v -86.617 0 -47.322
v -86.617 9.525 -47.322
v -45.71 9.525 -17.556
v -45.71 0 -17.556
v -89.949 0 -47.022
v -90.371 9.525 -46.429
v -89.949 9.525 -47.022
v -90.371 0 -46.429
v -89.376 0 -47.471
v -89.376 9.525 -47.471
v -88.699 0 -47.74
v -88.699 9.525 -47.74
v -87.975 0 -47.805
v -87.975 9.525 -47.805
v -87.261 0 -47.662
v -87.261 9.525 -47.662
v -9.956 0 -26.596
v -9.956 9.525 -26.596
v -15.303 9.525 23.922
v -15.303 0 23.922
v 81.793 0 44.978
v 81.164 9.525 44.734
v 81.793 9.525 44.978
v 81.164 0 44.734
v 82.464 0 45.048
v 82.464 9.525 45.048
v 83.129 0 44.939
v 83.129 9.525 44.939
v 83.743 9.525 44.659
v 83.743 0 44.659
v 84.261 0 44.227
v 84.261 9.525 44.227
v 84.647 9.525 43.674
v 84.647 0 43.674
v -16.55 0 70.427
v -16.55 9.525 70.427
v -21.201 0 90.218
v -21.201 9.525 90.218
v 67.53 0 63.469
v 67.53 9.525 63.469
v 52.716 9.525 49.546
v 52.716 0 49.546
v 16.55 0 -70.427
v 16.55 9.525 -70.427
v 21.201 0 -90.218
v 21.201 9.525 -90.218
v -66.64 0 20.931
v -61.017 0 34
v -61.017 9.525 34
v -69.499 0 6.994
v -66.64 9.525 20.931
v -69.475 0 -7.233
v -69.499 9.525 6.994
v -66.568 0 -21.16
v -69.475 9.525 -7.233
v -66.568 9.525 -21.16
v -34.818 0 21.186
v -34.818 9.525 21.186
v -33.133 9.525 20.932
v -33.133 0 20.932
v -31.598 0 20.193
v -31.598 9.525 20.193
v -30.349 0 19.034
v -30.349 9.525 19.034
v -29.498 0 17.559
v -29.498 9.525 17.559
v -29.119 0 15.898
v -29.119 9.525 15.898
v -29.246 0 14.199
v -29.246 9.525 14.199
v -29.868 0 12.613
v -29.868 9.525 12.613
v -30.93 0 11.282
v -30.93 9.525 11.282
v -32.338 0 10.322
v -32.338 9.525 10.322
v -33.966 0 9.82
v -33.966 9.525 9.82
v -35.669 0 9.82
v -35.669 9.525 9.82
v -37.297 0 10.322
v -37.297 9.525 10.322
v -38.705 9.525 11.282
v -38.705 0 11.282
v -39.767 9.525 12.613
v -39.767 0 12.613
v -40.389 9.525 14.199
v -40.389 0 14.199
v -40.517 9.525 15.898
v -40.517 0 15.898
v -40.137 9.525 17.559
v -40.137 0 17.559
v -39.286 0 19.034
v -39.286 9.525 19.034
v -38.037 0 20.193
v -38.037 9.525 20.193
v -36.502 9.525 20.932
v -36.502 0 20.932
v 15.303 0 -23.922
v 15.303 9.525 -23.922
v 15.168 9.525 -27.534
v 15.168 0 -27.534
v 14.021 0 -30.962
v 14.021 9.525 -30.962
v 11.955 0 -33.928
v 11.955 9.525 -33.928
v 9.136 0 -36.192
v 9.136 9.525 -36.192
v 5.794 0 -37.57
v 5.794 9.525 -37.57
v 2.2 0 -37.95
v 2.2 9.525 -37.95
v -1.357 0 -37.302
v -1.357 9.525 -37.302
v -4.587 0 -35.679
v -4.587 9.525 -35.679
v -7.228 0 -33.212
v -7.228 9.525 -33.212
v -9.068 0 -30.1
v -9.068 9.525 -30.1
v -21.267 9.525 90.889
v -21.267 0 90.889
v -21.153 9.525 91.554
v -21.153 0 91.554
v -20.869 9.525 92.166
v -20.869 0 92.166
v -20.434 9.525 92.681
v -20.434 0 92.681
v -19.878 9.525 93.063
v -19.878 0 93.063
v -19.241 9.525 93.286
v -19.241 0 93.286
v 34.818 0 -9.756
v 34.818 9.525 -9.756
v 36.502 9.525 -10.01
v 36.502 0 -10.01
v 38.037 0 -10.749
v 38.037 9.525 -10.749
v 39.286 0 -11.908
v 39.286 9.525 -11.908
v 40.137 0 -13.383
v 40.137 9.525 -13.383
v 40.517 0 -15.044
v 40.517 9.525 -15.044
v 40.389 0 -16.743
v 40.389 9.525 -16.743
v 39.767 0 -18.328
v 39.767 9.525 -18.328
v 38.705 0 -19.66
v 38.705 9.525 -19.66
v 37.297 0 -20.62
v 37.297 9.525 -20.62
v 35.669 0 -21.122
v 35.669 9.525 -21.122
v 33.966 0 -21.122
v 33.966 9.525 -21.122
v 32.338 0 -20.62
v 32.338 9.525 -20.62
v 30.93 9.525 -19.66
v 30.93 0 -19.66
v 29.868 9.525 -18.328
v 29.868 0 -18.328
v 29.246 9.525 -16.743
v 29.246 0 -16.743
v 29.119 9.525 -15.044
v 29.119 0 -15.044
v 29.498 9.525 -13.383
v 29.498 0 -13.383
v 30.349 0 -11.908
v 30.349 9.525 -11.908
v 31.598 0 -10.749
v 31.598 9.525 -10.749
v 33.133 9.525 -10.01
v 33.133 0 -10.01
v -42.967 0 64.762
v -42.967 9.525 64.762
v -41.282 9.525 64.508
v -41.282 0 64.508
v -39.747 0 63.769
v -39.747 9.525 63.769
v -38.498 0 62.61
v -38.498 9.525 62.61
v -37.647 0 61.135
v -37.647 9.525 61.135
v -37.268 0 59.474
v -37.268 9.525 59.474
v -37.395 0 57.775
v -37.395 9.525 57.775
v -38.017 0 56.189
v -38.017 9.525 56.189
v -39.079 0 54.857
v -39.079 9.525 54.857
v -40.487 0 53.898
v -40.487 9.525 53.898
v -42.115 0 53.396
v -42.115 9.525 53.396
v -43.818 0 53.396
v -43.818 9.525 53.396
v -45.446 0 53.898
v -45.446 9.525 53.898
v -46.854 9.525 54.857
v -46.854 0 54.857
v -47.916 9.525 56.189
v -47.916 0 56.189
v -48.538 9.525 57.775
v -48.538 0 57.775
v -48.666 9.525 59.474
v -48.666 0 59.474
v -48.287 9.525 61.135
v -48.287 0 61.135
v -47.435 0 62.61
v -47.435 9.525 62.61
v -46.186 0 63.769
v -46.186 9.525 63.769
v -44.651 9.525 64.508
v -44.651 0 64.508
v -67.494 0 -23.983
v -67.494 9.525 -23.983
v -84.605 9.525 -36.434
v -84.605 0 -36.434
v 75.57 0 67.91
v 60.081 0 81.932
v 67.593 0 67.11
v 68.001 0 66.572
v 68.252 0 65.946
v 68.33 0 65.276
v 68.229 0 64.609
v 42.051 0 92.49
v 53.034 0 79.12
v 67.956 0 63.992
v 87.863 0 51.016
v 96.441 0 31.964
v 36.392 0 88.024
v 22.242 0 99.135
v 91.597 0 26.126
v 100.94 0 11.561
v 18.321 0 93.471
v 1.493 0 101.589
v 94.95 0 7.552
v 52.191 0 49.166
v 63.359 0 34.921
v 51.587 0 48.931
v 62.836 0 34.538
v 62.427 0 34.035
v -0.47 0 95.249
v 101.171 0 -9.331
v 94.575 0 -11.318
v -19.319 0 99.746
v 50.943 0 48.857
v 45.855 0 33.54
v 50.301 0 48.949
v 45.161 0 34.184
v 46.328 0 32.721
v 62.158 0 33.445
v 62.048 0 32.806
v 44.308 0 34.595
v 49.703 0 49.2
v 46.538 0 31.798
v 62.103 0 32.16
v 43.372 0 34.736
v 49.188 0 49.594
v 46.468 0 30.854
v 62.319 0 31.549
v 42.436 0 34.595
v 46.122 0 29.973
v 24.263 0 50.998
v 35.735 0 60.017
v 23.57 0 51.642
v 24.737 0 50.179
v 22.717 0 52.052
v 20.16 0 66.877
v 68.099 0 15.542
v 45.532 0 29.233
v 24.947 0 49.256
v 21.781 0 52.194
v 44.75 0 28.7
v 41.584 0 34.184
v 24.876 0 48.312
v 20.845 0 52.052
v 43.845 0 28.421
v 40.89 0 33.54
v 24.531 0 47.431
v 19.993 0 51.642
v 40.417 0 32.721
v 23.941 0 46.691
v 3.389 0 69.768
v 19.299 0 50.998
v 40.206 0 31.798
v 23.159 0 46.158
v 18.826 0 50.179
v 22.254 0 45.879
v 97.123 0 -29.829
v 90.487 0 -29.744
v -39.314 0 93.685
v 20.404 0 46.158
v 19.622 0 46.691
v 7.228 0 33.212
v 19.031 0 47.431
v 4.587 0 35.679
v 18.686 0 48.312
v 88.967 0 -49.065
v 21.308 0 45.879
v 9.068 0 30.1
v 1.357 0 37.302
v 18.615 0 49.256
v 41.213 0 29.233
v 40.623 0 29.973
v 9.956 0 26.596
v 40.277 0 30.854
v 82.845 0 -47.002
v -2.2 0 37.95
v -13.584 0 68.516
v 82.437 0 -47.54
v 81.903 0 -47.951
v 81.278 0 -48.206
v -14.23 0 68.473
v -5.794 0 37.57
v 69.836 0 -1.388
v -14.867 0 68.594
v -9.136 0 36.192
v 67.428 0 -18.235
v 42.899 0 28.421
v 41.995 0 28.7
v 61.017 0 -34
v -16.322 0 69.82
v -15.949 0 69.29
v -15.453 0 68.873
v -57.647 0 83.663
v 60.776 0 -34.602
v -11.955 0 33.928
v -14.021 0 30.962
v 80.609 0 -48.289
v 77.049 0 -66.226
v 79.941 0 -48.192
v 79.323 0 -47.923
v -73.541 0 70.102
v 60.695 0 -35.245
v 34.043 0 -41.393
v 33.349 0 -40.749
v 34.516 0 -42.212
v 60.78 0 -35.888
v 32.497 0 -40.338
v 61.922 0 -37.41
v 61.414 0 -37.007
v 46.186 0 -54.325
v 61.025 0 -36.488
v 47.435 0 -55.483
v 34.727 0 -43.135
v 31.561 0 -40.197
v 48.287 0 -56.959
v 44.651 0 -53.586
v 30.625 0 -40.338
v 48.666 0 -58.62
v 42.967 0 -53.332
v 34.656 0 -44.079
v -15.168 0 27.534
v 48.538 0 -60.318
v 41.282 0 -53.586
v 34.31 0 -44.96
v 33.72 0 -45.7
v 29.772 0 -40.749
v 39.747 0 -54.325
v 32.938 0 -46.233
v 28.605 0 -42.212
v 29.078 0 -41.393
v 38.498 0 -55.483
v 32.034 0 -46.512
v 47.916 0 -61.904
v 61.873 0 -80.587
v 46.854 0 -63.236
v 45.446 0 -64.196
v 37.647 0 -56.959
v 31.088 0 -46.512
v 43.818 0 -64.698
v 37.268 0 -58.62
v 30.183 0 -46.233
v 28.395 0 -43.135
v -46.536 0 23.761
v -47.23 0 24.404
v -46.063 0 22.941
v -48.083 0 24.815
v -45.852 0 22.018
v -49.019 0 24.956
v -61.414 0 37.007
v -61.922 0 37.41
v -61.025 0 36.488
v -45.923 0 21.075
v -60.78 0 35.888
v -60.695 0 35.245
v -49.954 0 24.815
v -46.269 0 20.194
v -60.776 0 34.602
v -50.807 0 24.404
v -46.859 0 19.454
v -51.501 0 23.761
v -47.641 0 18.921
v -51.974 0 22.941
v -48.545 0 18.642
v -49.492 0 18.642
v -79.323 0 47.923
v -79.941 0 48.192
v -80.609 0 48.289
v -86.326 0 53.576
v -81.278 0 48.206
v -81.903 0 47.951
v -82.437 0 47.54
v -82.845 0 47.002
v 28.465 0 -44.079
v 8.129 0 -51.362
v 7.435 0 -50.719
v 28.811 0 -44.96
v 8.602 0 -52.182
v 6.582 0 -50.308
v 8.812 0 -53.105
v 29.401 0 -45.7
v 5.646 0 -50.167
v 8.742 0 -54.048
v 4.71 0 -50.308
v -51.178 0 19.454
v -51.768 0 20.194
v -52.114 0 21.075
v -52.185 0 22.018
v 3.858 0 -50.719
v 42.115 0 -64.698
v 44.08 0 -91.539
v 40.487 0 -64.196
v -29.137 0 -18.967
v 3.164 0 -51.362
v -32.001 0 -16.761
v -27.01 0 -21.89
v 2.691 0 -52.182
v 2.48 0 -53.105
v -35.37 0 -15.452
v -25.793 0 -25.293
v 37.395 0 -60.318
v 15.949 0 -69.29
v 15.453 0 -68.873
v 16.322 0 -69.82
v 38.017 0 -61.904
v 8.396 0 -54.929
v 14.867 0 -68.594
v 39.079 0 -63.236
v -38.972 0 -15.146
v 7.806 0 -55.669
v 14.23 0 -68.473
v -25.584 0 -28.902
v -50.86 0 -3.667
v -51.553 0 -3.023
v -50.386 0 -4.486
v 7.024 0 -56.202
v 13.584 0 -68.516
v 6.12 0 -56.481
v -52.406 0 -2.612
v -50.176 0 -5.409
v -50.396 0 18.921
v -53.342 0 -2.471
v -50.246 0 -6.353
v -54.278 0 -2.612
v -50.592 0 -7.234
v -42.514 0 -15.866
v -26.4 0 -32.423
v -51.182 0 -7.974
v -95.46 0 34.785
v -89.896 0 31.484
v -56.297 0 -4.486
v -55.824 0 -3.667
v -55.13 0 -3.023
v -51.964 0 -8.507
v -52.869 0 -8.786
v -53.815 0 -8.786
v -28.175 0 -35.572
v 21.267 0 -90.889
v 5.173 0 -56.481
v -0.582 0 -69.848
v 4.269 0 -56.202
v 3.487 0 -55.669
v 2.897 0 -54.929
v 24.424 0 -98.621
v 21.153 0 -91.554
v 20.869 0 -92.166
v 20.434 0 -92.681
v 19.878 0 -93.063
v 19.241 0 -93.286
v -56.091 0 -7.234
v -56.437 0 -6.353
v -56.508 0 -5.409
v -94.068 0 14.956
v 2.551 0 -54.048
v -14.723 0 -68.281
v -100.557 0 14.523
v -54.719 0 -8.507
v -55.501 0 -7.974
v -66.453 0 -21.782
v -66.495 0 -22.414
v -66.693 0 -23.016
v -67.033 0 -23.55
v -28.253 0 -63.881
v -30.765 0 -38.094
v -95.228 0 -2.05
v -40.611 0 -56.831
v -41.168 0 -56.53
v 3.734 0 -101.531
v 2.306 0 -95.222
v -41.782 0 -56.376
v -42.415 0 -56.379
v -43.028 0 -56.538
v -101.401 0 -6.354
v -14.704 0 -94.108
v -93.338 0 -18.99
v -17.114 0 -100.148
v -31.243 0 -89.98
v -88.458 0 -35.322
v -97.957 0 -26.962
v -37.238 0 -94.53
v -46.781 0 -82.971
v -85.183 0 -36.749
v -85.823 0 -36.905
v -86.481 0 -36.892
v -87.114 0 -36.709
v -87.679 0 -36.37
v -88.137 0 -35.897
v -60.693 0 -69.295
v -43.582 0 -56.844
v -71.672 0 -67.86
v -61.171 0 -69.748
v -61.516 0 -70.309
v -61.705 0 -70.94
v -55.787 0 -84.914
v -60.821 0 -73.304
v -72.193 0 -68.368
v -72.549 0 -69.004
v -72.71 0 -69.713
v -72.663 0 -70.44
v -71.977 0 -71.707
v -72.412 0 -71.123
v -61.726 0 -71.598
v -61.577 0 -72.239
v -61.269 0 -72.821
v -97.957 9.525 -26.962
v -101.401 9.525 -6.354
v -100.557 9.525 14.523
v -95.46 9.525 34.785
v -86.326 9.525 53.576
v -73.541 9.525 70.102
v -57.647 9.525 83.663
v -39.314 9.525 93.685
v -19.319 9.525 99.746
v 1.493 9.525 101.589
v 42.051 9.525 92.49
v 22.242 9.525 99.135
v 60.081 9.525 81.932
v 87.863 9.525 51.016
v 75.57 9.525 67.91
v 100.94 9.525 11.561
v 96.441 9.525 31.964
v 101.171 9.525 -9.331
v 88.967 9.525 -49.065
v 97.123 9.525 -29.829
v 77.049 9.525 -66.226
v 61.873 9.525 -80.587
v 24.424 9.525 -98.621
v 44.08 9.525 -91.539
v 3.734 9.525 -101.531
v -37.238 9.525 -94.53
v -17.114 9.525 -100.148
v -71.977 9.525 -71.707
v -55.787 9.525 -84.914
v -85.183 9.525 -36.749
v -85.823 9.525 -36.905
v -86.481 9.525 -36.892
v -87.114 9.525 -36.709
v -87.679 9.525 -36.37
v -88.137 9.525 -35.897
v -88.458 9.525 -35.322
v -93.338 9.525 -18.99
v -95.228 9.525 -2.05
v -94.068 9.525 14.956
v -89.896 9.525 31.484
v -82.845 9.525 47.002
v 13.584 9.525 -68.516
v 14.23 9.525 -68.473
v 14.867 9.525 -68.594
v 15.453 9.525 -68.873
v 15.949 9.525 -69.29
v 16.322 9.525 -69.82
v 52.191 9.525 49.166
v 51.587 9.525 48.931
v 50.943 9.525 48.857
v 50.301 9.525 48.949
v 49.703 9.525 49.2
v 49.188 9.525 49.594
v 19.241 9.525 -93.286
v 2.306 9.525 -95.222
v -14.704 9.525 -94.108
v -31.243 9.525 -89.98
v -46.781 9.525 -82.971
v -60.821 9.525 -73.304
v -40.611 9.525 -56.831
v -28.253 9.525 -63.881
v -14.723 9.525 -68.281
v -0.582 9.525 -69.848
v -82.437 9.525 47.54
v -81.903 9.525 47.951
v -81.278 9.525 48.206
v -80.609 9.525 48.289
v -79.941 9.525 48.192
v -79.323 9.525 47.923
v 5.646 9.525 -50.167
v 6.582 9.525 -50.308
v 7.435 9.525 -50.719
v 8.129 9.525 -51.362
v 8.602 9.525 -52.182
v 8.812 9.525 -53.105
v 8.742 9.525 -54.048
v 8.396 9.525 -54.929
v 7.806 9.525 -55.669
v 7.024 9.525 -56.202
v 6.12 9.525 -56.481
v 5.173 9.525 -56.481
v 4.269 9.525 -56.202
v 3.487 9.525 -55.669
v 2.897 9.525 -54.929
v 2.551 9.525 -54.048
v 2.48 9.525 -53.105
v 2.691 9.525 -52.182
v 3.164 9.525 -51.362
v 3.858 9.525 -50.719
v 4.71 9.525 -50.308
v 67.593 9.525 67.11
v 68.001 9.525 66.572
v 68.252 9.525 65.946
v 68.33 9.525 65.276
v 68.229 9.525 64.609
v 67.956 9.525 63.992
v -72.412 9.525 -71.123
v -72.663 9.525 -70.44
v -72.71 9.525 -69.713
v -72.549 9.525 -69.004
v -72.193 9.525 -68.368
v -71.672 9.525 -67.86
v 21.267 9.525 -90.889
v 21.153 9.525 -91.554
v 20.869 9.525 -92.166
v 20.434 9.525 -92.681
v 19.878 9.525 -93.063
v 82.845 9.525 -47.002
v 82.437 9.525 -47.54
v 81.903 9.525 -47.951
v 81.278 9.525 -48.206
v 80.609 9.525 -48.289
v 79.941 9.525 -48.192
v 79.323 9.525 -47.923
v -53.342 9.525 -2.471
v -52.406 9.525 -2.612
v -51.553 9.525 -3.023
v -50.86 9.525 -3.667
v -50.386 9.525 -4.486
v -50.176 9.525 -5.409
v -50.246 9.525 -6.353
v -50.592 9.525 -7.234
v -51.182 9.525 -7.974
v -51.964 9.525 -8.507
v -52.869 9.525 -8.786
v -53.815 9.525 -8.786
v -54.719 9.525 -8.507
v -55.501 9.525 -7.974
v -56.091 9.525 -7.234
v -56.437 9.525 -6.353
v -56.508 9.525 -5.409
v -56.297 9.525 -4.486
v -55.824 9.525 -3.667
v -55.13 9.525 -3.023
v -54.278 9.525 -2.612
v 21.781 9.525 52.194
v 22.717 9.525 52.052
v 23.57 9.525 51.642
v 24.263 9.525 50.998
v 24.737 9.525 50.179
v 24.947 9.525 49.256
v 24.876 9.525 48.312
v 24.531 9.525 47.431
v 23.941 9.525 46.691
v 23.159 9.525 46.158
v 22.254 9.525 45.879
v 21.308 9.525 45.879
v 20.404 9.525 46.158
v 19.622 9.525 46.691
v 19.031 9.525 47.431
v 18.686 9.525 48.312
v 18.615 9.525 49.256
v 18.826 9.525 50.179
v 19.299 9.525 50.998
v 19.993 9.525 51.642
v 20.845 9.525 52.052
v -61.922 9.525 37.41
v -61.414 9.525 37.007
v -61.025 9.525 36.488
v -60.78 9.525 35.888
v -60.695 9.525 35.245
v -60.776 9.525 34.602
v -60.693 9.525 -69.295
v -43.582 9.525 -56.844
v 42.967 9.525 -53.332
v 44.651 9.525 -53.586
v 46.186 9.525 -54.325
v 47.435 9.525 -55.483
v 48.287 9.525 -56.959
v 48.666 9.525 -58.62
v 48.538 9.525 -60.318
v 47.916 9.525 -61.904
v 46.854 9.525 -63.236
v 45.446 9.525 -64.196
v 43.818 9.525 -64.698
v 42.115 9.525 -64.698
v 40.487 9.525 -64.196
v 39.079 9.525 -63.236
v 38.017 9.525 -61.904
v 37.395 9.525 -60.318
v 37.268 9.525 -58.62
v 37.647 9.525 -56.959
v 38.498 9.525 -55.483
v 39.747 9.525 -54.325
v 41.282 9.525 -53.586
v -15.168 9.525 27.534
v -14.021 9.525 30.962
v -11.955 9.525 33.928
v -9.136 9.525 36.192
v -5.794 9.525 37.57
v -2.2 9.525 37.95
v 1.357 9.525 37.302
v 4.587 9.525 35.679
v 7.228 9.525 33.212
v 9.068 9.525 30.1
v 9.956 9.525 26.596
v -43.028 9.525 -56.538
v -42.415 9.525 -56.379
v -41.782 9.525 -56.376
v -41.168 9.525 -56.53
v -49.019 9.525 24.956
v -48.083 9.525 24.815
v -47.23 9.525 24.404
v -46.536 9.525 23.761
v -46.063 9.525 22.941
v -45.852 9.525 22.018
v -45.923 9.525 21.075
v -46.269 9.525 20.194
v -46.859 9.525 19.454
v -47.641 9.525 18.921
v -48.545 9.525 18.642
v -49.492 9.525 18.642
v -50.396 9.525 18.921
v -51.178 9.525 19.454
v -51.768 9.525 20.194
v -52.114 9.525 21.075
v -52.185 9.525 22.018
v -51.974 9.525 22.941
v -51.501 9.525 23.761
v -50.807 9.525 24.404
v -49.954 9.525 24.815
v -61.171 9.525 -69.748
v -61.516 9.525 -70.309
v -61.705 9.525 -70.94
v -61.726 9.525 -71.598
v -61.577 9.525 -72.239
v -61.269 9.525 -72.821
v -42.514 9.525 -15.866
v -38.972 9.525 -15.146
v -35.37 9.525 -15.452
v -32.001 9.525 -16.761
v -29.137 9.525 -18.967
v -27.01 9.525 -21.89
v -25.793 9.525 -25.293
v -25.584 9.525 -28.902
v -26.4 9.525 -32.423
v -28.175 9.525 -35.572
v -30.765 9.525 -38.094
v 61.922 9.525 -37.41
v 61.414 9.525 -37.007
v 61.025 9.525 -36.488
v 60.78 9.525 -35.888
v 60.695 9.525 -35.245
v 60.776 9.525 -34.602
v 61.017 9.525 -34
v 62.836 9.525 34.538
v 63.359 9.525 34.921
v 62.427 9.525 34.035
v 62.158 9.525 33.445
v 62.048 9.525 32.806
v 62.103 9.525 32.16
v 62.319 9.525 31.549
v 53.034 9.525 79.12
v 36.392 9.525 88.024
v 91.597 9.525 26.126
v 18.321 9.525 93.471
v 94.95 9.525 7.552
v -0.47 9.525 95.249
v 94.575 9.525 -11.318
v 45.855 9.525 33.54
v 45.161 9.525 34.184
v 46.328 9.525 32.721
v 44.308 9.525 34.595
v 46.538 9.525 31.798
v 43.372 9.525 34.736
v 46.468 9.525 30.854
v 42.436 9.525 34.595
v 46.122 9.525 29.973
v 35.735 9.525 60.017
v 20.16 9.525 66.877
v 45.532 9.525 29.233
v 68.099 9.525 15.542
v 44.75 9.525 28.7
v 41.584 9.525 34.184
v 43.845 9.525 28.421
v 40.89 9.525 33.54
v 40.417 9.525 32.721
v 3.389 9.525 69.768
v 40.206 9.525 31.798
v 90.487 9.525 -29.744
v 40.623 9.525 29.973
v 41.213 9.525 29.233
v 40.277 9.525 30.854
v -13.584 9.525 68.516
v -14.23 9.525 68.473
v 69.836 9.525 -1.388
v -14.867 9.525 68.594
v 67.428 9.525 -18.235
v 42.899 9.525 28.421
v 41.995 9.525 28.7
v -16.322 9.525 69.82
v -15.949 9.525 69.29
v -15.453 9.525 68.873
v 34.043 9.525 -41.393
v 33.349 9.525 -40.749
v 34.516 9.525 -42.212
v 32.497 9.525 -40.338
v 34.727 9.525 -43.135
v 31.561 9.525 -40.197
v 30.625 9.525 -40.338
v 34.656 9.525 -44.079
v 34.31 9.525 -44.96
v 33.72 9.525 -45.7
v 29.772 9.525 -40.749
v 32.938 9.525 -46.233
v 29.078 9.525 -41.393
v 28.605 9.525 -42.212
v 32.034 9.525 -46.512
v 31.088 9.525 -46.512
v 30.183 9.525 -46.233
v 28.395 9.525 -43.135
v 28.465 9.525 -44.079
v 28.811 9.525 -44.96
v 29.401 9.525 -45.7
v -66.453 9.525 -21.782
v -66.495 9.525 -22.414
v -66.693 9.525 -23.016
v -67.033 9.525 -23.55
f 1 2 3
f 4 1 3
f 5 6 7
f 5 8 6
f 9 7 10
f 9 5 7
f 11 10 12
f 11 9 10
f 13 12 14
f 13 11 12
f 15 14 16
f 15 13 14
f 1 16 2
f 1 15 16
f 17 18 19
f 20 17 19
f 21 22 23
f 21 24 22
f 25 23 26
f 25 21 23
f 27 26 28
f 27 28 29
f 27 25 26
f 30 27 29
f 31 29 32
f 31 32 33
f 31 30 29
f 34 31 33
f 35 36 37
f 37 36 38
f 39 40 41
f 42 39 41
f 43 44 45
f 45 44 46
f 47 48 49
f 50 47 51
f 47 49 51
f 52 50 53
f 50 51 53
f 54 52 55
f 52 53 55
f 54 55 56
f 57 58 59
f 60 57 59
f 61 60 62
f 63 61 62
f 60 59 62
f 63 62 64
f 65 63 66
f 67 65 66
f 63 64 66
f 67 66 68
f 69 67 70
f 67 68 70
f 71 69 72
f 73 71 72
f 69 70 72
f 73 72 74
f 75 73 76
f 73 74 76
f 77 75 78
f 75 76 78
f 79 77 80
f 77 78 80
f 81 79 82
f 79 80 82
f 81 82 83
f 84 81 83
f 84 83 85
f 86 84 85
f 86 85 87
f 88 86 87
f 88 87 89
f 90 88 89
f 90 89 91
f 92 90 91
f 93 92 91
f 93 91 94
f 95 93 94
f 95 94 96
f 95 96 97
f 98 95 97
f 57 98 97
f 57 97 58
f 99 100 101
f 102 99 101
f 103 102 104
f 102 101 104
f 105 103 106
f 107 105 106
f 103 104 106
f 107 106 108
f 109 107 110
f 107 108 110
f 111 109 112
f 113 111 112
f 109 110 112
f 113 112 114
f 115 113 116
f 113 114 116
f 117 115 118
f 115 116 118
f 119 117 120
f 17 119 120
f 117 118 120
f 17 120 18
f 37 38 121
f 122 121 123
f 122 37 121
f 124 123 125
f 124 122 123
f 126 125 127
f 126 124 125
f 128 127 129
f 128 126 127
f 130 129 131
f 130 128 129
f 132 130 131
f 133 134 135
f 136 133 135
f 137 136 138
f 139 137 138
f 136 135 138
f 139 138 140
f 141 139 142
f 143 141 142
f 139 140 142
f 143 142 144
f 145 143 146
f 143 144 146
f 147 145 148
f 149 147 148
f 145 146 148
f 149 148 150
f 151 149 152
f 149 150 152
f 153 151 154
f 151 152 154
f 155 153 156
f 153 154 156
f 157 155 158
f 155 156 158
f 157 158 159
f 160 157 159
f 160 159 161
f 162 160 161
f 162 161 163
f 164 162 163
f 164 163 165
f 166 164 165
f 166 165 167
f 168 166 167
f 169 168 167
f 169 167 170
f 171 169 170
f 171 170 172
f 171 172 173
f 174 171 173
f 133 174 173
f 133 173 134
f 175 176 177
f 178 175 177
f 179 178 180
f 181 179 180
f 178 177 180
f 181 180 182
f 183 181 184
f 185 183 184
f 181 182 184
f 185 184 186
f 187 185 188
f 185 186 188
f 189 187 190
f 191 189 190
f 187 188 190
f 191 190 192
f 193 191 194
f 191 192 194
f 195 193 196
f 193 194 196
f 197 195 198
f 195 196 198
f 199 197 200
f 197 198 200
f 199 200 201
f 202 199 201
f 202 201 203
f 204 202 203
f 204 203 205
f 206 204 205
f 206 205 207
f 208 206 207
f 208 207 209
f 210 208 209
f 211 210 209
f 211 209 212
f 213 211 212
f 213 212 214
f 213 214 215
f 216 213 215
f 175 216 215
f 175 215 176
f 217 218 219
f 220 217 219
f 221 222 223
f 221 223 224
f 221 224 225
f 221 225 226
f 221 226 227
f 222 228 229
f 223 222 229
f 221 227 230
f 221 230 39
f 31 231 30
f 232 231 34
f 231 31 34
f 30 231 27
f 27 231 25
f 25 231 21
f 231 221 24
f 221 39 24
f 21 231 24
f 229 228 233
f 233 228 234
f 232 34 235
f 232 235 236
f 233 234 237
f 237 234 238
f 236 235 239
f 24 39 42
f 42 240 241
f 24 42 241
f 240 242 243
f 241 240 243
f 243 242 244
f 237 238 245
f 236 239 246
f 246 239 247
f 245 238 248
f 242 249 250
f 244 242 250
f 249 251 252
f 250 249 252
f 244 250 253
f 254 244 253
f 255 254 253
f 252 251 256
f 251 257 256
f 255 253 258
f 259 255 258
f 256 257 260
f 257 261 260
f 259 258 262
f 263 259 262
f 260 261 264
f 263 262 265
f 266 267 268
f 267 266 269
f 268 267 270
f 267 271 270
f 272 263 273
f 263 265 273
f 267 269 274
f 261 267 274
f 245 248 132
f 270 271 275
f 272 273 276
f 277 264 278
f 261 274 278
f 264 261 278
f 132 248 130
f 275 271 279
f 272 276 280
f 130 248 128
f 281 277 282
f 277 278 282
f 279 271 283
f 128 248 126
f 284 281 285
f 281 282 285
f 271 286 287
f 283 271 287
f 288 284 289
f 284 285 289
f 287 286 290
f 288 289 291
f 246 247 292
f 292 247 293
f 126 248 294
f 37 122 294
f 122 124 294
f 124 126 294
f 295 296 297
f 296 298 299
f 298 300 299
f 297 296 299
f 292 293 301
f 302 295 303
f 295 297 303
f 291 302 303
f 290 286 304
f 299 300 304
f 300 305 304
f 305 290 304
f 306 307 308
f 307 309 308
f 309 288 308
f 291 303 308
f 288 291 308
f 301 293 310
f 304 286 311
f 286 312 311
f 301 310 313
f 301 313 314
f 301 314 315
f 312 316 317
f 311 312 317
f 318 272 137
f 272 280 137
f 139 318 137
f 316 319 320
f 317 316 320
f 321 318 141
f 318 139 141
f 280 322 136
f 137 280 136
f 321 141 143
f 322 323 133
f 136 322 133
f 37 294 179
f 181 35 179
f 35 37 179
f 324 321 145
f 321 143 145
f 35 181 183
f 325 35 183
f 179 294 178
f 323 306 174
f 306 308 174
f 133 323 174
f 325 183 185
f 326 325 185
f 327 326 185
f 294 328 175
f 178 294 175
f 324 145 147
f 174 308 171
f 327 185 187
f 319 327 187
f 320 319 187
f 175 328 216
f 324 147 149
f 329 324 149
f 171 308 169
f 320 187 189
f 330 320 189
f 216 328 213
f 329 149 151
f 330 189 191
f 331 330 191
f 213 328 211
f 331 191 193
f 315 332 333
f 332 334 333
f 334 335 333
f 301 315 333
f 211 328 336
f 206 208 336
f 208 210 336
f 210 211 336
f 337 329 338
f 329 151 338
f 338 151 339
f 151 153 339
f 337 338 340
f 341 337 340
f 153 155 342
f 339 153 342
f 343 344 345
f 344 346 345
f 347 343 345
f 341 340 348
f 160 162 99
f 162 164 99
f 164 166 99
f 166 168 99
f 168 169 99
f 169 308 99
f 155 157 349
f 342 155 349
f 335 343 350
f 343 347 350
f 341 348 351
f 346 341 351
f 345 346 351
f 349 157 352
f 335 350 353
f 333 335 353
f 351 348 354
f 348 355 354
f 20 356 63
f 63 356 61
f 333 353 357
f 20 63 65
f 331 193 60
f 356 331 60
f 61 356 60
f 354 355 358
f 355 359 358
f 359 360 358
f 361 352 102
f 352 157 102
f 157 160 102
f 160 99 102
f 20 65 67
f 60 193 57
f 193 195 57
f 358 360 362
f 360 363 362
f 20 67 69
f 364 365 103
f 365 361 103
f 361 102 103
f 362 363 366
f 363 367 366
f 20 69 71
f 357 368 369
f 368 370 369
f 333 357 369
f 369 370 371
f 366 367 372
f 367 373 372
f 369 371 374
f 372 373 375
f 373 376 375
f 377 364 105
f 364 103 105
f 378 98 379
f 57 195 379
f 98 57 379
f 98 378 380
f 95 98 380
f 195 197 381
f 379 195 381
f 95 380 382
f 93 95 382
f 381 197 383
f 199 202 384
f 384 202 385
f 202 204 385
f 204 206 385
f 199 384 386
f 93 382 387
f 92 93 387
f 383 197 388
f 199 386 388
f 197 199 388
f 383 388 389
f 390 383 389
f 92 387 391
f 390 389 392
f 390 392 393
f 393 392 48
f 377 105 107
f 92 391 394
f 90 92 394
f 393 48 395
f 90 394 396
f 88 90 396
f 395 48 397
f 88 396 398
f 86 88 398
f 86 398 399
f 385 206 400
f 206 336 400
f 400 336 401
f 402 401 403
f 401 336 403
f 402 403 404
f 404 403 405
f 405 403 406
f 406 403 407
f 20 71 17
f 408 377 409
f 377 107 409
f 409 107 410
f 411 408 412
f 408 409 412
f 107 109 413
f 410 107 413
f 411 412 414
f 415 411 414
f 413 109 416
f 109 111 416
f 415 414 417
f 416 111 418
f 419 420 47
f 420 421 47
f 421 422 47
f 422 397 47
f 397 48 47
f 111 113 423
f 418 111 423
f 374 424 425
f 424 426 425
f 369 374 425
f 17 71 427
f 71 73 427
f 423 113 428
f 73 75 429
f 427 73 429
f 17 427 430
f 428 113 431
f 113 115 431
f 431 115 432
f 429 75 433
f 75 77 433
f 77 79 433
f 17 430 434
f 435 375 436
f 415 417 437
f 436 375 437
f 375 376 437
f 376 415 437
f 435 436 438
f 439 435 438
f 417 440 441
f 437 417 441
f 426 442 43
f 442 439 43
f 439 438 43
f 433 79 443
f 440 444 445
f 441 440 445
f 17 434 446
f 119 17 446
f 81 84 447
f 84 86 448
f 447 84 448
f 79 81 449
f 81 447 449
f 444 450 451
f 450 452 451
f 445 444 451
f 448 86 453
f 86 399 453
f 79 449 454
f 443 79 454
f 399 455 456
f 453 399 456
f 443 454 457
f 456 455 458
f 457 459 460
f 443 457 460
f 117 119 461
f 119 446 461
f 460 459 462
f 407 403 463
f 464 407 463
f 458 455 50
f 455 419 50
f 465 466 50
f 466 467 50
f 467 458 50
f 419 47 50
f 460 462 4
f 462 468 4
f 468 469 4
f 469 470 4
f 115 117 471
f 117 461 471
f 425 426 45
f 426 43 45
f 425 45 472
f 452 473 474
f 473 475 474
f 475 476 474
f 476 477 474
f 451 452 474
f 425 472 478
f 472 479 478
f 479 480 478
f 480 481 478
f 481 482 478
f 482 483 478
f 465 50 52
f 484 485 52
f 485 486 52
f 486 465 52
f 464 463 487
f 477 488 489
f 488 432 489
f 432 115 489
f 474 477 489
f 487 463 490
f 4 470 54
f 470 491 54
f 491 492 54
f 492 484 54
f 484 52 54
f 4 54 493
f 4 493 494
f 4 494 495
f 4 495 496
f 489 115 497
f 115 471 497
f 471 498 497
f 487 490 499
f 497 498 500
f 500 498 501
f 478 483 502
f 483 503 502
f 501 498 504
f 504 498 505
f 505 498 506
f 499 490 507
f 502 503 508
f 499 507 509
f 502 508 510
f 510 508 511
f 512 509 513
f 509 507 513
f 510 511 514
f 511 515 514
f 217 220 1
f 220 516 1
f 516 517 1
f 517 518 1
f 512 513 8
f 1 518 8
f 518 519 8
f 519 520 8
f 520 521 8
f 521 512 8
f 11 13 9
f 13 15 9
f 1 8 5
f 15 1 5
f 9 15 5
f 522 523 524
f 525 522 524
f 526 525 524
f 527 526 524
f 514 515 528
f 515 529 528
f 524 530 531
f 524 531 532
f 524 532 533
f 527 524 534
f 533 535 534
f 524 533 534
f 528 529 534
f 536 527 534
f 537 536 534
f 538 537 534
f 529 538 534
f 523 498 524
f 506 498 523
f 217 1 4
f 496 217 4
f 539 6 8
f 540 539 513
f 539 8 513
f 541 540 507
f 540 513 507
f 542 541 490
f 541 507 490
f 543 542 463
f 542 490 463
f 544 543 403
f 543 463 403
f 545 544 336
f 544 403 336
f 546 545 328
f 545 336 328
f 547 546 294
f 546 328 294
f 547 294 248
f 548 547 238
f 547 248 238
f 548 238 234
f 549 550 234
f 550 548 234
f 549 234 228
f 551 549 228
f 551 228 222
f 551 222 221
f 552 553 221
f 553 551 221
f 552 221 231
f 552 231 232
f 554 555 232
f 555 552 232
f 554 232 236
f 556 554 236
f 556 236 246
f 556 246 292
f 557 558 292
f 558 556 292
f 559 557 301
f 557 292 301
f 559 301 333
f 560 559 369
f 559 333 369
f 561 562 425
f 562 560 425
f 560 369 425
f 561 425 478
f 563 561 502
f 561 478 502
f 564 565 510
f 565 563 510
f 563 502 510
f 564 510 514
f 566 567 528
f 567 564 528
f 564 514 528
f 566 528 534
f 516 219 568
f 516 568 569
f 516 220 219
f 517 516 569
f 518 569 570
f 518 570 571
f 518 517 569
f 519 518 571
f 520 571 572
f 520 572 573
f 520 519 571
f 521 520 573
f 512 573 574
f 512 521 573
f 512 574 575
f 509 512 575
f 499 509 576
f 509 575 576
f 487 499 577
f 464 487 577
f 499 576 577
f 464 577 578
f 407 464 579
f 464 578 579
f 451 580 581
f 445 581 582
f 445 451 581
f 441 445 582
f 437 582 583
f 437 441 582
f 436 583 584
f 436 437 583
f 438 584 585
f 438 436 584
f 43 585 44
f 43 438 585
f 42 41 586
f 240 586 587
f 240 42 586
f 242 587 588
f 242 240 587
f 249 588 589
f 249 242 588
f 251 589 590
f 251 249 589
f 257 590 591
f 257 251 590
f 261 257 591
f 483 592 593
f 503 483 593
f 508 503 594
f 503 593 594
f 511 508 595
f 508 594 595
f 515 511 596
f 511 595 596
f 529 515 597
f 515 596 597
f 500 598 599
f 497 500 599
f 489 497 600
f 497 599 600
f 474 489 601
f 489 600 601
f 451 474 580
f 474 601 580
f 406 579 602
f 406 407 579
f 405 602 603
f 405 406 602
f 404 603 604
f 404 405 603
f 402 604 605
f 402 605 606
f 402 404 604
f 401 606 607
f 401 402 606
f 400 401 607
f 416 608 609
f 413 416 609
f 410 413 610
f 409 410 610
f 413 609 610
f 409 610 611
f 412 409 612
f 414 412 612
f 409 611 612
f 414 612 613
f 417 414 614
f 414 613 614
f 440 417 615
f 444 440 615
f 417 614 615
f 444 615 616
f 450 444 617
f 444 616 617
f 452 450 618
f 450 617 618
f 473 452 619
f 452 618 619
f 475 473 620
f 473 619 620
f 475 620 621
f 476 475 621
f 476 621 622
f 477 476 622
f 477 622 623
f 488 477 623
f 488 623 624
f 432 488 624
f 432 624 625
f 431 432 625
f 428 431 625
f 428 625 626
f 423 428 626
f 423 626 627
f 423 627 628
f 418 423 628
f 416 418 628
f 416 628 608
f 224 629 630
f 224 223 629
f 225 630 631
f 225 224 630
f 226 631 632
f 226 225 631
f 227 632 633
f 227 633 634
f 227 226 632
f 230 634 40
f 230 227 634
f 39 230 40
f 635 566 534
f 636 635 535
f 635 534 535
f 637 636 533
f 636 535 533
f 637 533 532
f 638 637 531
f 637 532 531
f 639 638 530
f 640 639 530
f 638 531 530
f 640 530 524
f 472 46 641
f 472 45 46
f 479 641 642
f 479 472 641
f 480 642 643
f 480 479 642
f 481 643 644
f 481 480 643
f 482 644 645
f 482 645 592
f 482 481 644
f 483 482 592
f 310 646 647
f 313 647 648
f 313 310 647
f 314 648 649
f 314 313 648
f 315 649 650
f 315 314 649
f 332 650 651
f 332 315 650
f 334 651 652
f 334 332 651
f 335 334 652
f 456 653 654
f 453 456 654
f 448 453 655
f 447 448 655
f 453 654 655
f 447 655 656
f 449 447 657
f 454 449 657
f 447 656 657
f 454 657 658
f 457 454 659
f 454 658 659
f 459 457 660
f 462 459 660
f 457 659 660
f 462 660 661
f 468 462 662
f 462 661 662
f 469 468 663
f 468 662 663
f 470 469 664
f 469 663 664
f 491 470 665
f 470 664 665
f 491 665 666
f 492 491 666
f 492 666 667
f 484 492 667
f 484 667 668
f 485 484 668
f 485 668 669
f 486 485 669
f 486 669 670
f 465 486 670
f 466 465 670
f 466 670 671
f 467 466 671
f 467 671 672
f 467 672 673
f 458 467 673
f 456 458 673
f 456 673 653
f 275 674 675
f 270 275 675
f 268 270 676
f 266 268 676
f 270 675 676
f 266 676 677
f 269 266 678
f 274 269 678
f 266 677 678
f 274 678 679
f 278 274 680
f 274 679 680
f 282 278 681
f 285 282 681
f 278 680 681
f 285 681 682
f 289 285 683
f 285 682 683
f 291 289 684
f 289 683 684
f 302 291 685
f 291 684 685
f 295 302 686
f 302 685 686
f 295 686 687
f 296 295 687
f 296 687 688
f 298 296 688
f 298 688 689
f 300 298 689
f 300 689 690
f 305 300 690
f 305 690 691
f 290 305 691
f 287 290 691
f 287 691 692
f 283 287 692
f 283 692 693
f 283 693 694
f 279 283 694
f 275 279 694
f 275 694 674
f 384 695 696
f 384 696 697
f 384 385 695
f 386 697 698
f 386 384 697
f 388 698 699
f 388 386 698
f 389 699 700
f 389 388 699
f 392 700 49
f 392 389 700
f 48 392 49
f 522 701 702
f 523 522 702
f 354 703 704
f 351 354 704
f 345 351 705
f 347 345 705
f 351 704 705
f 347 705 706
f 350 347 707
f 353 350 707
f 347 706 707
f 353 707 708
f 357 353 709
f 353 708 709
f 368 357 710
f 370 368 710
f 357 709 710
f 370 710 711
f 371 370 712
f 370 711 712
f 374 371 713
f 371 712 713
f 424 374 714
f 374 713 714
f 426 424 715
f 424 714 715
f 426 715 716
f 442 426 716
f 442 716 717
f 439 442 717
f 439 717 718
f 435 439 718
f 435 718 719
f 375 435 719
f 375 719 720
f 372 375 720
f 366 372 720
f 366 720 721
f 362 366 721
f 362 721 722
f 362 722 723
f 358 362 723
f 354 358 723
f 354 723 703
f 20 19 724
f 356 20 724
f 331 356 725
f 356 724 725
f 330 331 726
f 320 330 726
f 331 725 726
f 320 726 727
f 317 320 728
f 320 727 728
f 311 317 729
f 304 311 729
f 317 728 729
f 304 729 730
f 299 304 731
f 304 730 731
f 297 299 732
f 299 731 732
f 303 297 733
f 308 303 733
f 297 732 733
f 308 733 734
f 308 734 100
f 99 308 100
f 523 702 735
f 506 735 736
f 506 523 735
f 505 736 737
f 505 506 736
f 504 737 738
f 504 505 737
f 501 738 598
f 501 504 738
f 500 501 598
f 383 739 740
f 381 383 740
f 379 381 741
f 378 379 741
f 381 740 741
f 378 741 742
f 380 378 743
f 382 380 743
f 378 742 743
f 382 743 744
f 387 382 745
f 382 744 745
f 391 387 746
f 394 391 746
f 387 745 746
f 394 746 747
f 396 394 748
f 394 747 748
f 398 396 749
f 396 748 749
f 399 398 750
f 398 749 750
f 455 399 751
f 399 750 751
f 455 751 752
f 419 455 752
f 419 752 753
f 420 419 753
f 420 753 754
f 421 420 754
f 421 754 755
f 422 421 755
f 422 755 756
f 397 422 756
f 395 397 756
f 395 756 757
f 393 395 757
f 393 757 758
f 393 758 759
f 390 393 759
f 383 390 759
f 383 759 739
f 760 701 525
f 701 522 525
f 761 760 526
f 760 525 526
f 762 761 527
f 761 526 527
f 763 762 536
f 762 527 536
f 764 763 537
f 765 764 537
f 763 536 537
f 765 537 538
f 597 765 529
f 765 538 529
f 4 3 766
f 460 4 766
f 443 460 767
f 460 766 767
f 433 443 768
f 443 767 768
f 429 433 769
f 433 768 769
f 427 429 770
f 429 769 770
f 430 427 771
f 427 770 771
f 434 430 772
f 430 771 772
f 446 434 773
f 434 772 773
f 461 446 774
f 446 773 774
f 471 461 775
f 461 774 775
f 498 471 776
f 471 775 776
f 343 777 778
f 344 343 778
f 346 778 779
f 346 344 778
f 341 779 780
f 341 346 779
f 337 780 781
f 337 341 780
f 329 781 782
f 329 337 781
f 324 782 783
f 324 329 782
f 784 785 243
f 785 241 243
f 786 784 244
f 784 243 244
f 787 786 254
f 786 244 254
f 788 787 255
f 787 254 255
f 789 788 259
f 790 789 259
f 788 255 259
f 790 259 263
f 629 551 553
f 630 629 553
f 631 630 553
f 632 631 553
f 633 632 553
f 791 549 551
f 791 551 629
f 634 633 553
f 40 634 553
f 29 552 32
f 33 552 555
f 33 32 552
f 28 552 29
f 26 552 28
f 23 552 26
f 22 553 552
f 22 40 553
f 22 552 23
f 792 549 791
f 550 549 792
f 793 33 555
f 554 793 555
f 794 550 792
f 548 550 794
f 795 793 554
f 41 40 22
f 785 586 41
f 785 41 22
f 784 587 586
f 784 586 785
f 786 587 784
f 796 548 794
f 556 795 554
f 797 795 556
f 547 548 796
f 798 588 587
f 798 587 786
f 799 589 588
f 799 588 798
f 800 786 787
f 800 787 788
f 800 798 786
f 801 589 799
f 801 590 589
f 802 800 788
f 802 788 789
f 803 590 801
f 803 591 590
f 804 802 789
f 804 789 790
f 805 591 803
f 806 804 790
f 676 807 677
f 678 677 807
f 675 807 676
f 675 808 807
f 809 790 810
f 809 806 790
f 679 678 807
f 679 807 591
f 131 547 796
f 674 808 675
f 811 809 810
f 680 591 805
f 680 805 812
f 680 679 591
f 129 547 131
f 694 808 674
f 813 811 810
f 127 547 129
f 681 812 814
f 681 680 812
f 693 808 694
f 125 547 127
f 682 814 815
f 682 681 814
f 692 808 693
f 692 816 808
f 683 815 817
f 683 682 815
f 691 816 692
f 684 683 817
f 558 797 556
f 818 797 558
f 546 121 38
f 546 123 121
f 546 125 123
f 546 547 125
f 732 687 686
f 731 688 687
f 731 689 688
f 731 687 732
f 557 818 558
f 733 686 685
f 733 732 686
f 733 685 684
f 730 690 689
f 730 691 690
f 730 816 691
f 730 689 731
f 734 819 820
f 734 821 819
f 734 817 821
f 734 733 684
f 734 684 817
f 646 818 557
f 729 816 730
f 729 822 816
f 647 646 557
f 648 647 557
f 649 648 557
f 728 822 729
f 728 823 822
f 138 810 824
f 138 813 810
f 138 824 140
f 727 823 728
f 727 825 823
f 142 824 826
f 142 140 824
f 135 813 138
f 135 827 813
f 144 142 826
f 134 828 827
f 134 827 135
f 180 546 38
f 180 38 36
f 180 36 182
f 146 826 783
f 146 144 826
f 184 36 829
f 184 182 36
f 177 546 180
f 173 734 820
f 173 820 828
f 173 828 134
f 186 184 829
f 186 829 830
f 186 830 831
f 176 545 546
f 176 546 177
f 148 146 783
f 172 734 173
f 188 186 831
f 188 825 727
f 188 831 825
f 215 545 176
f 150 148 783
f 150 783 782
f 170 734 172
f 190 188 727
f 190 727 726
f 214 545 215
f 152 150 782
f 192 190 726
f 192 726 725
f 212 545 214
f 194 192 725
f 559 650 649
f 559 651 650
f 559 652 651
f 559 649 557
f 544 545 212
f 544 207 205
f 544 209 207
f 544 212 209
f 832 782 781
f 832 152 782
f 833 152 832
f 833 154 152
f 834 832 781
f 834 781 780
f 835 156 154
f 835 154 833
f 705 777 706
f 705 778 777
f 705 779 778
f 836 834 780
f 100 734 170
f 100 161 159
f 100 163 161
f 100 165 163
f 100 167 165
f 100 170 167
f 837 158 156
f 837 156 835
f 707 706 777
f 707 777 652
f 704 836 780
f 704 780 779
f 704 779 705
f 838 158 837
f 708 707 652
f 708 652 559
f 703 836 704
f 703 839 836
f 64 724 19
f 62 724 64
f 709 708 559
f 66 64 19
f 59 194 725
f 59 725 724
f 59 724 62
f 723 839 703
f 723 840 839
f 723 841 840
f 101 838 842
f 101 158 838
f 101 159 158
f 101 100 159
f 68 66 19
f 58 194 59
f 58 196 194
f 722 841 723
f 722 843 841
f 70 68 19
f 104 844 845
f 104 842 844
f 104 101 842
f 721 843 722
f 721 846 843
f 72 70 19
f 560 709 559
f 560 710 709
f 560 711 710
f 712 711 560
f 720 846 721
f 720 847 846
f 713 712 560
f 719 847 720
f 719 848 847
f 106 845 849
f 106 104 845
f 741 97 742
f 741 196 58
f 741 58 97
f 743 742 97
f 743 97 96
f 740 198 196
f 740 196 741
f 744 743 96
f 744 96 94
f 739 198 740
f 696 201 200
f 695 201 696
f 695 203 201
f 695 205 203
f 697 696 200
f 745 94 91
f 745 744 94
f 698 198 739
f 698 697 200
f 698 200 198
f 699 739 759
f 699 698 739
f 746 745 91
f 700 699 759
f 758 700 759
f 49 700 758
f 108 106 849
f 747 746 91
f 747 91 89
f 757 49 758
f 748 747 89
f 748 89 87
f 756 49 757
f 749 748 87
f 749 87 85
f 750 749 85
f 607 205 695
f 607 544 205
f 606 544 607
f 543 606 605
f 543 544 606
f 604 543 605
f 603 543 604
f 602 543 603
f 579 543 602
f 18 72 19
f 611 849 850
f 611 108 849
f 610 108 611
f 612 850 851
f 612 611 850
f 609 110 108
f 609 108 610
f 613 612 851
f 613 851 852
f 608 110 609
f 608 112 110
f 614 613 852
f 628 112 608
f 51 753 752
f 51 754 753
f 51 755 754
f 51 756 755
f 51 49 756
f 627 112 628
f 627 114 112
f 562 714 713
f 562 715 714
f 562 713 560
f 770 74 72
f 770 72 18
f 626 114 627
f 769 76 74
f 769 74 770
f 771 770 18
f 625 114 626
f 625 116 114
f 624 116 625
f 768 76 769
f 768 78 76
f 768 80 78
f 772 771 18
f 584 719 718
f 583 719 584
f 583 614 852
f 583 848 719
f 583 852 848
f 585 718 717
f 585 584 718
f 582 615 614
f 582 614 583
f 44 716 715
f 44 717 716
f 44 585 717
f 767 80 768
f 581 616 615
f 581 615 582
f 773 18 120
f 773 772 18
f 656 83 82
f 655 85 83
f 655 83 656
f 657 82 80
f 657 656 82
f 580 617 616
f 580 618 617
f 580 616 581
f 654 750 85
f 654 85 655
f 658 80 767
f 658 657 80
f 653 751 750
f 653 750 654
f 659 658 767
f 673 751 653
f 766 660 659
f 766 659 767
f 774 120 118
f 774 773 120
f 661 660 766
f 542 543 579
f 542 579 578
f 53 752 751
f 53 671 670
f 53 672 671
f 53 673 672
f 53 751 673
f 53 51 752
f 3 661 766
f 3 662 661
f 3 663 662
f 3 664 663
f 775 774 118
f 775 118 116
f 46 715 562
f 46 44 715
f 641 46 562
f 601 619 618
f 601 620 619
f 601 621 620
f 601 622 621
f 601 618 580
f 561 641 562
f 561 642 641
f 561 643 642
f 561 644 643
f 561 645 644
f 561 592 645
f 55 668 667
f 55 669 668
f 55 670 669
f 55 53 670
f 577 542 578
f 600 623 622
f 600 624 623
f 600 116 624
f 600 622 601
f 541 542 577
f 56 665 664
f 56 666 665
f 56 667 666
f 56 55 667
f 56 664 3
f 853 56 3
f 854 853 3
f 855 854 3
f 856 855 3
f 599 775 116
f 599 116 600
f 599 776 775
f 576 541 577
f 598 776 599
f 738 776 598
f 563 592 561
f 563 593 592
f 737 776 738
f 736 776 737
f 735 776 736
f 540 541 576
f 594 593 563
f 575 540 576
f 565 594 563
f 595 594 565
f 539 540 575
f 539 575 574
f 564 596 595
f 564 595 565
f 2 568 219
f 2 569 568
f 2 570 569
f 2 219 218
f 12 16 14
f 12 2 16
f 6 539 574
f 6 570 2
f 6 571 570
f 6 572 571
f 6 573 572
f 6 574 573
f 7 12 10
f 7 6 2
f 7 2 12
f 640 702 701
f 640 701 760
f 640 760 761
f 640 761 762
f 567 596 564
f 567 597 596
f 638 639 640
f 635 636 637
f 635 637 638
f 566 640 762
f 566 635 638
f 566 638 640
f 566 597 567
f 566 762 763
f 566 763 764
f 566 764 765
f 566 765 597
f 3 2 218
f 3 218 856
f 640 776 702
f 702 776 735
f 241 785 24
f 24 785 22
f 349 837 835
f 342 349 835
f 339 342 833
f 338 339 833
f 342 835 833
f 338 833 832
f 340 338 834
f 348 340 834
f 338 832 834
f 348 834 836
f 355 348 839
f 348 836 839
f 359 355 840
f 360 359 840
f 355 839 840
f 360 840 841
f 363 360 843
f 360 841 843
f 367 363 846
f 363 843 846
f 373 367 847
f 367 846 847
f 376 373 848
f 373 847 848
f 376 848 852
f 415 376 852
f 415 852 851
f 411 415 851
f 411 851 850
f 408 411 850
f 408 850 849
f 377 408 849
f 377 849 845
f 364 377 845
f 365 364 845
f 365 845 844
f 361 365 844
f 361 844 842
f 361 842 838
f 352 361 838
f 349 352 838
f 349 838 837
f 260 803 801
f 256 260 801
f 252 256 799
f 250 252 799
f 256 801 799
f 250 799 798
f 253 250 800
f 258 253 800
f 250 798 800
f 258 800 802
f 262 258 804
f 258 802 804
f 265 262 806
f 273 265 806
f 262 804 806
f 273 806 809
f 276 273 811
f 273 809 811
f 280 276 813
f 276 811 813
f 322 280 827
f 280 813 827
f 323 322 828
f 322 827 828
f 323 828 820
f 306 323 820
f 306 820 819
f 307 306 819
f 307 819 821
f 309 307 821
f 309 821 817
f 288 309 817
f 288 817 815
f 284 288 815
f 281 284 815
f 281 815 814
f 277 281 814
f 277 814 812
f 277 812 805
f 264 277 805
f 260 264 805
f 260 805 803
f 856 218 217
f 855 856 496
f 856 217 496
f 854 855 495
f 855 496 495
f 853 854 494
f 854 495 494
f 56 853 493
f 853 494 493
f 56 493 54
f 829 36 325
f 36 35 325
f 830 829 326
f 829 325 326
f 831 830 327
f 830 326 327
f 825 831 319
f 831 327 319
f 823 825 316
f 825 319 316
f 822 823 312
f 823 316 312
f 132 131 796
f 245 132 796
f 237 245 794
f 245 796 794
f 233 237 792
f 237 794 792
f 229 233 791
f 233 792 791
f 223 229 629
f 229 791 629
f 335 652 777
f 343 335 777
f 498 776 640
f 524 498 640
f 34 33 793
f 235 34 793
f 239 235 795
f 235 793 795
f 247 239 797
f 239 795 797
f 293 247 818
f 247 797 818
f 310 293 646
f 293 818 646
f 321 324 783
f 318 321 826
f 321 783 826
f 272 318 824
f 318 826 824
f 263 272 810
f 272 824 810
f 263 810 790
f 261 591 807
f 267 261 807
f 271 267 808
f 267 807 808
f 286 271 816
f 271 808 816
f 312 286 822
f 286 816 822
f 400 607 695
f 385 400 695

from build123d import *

# Parameters (mm, degrees)
SKETCH1_R           = 101.6
BOSS_EXTRUDE1_DEPTH = 9.525
SKETCH2_R           = 4.7625
SKETCH2_R_2         = 3.175
CUT_EXTRUDE1_DEPTH  = 22.86
SKETCH3_R           = 4.7625
CUT_EXTRUDE2_DEPTH  = 144.999463975
FILLET1_R           = 2.54
FILLET3_R           = 2.54
SKETCH4_R           = 5.715
CUT_EXTRUDE3_DEPTH  = 17.78


with BuildPart() as part:
    # Sketch1 → Boss-Extrude1 (new body)
    with BuildSketch(Plane(origin=(0, 0, 0), x_dir=(1, 0, 0), z_dir=(0, 1, 0))):
        with Locations(Location((0, 0, 0), (0, 0, 90))):
            Circle(SKETCH1_R)
    extrude(amount=BOSS_EXTRUDE1_DEPTH)

    # Sketch2 → Cut-Extrude1 (cut)
    with BuildSketch(Plane(origin=(0, 9.525, 0), x_dir=(1, 0, 0), z_dir=(0, 1, 0))):
        with BuildLine():
            Line((-9.955759688, 26.595729902), (-15.303128109, -23.922045692))
            ThreePointArc((-15.303128109, -23.922045692), (-4.010526316, -37.888331696), (9.955759688, -26.595729902))
            Line((9.955759688, -26.595729902), (15.303128109, 23.922045692))
            ThreePointArc((15.303128109, 23.922045692), (4.010526316, 37.888331696), (-9.955759688, 26.595729902))
        make_face()
        with Locations(Location((34.817520913, 15.470948176, 0), (0, 0, 270))):
            Circle(SKETCH2_R)
        with Locations(Location((-34.817520913, -15.470948176, 0), (0, 0, 270))):
            Circle(SKETCH2_R)
        with BuildLine():
            Line((-30.765292524, 38.093536125), (-87.237043764, 79.186441231))
            Line((-87.237043764, 79.186441231), (-104.485964967, 60.325))
            Line((-104.485964967, 60.325), (-45.710214871, 17.555539727))
            ThreePointArc((-45.710214871, 17.555539727), (-27.968755498, 20.352076753), (-30.765292524, 38.093536125))
        make_face()
        with Locations(Location((5.646300897, 53.341856998, 0), (0, 0, 270))):
            Circle(SKETCH2_R_2)
        with Locations(Location((31.560768513, 43.372252797, 0), (0, 0, 270))):
            Circle(SKETCH2_R_2)
        with Locations(Location((-53.341856998, 5.646300897, 0), (0, 0, 270))):
            Circle(SKETCH2_R_2)
        with Locations(Location((43.372252797, -31.560768513, 0), (0, 0, 270))):
            Circle(SKETCH2_R_2)
        with Locations(Location((-49.018553694, -21.781088485, 0), (0, 0, 270))):
            Circle(SKETCH2_R_2)
        with Locations(Location((21.781088485, -49.018553694, 0), (0, 0, 270))):
            Circle(SKETCH2_R_2)
    extrude(amount=-CUT_EXTRUDE1_DEPTH, mode=Mode.SUBTRACT)

    # Sketch3 → Cut-Extrude2 (cut, through all)
    with BuildSketch(Plane(origin=(0, 9.525, 0), x_dir=(1, 0, 0), z_dir=(0, 1, 0))):
        with BuildLine():
            Line((61.173834056, -33.71623536), (83.418864622, -45.976684582))
            ThreePointArc((83.418864622, -45.976684582), (95.231198209, 1.892455481), (81.526409141, 49.254513627))
            Line((81.526409141, 49.254513627), (59.78603337, 36.119976659))
            ThreePointArc((59.78603337, 36.119976659), (69.83621202, 1.387800686), (61.173834056, -33.71623536))
        make_face()
        with BuildLine():
            ThreePointArc((50.898077232, -47.837310063), (20.160372855, -66.87736438), (-15.979287148, -67.997682918))
            Line((-15.979287148, -67.997682918), (-21.78993702, -92.72411307))
            ThreePointArc((-21.78993702, -92.72411307), (27.491417529, -91.196405972), (69.406468953, -65.232695541))
            Line((69.406468953, -65.232695541), (50.898077232, -47.837310063))
        make_face()
        with BuildLine():
            ThreePointArc((-59.78603337, -36.119976659), (-69.466812234, -7.306469604), (-65.992729528, 22.890656378))
            Line((-65.992729528, 22.890656378), (-87.200441174, 38.322911673))
            ThreePointArc((-87.200441174, 38.322911673), (-95.050717303, -6.15821729), (-81.526409141, -49.254513627))
            Line((-81.526409141, -49.254513627), (-59.78603337, -36.119976659))
        make_face()
        with BuildLine():
            Line((-63.288565419, 71.183705911), (-42.080853774, 55.751450615))
            ThreePointArc((-42.080853774, 55.751450615), (-14.415807175, 68.34622889), (15.979287148, 67.997682918))
            Line((15.979287148, 67.997682918), (21.78993702, 92.72411307))
            ThreePointArc((21.78993702, 92.72411307), (-23.37800943, 92.33651052), (-63.288565419, 71.183705911))
        make_face()
        with Locations(Location((42.966651746, 59.046739645, 0), (0, 0, 270))):
            Circle(SKETCH3_R)
        with Locations(Location((-42.966651746, -59.046739645, 0), (0, 0, 270))):
            Circle(SKETCH3_R)
    extrude(amount=-CUT_EXTRUDE2_DEPTH, mode=Mode.SUBTRACT)

    # Fillet1
    fillet1_edges = [part.edges().sort_by_distance(p)[0] for p in [
        (-74.035185173, 4.7625, -69.579820037),
        (-88.980107519, 4.7625, -49.041823639),
    ]]
    fillet(fillet1_edges, radius=FILLET1_R)

    # Fillet3
    fillet3_edges = [part.edges().sort_by_distance(p)[0] for p in [
        (15.979287148, 4.7625, -67.997682918),
        (-42.080853774, 4.7625, -55.751450615),
        (-63.288565419, 4.7625, -71.183705911),
        (21.78993702, 4.7625, -92.72411307),
        (59.78603337, 4.7625, -36.119976659),
        (81.526409141, 4.7625, -49.254513627),
        (83.418864622, 4.7625, 45.976684582),
        (61.173834056, 4.7625, 33.71623536),
        (-15.979287148, 4.7625, 67.997682918),
        (50.898077232, 4.7625, 47.837310063),
        (69.406468953, 4.7625, 65.232695541),
        (-21.78993702, 4.7625, 92.72411307),
        (-59.78603337, 4.7625, 36.119976659),
        (-81.526409141, 4.7625, 49.254513627),
        (-87.200441174, 4.7625, -38.322911673),
        (-65.992729528, 4.7625, -22.890656378),
    ]]
    fillet(fillet3_edges, radius=FILLET3_R)

    # Sketch4 → Cut-Extrude3 (cut)
    with BuildSketch(Plane(origin=(0, 9.525, 0), x_dir=(1, 0, 0), z_dir=(0, 1, 0))):
        with Locations(Location((42.966651746, 59.046739645, 0), (0, 0, 270))):
            Circle(SKETCH4_R)
        with Locations(Location((-42.966651746, -59.046739645, 0), (0, 0, 270))):
            Circle(SKETCH4_R)
        with Locations(Location((-34.817520913, -15.470948176, 0), (0, 0, 270))):
            Circle(SKETCH4_R)
        with Locations(Location((34.817520913, 15.470948176, 0), (0, 0, 270))):
            Circle(SKETCH4_R)
    extrude(amount=-CUT_EXTRUDE3_DEPTH, mode=Mode.SUBTRACT)


solid = part.part
